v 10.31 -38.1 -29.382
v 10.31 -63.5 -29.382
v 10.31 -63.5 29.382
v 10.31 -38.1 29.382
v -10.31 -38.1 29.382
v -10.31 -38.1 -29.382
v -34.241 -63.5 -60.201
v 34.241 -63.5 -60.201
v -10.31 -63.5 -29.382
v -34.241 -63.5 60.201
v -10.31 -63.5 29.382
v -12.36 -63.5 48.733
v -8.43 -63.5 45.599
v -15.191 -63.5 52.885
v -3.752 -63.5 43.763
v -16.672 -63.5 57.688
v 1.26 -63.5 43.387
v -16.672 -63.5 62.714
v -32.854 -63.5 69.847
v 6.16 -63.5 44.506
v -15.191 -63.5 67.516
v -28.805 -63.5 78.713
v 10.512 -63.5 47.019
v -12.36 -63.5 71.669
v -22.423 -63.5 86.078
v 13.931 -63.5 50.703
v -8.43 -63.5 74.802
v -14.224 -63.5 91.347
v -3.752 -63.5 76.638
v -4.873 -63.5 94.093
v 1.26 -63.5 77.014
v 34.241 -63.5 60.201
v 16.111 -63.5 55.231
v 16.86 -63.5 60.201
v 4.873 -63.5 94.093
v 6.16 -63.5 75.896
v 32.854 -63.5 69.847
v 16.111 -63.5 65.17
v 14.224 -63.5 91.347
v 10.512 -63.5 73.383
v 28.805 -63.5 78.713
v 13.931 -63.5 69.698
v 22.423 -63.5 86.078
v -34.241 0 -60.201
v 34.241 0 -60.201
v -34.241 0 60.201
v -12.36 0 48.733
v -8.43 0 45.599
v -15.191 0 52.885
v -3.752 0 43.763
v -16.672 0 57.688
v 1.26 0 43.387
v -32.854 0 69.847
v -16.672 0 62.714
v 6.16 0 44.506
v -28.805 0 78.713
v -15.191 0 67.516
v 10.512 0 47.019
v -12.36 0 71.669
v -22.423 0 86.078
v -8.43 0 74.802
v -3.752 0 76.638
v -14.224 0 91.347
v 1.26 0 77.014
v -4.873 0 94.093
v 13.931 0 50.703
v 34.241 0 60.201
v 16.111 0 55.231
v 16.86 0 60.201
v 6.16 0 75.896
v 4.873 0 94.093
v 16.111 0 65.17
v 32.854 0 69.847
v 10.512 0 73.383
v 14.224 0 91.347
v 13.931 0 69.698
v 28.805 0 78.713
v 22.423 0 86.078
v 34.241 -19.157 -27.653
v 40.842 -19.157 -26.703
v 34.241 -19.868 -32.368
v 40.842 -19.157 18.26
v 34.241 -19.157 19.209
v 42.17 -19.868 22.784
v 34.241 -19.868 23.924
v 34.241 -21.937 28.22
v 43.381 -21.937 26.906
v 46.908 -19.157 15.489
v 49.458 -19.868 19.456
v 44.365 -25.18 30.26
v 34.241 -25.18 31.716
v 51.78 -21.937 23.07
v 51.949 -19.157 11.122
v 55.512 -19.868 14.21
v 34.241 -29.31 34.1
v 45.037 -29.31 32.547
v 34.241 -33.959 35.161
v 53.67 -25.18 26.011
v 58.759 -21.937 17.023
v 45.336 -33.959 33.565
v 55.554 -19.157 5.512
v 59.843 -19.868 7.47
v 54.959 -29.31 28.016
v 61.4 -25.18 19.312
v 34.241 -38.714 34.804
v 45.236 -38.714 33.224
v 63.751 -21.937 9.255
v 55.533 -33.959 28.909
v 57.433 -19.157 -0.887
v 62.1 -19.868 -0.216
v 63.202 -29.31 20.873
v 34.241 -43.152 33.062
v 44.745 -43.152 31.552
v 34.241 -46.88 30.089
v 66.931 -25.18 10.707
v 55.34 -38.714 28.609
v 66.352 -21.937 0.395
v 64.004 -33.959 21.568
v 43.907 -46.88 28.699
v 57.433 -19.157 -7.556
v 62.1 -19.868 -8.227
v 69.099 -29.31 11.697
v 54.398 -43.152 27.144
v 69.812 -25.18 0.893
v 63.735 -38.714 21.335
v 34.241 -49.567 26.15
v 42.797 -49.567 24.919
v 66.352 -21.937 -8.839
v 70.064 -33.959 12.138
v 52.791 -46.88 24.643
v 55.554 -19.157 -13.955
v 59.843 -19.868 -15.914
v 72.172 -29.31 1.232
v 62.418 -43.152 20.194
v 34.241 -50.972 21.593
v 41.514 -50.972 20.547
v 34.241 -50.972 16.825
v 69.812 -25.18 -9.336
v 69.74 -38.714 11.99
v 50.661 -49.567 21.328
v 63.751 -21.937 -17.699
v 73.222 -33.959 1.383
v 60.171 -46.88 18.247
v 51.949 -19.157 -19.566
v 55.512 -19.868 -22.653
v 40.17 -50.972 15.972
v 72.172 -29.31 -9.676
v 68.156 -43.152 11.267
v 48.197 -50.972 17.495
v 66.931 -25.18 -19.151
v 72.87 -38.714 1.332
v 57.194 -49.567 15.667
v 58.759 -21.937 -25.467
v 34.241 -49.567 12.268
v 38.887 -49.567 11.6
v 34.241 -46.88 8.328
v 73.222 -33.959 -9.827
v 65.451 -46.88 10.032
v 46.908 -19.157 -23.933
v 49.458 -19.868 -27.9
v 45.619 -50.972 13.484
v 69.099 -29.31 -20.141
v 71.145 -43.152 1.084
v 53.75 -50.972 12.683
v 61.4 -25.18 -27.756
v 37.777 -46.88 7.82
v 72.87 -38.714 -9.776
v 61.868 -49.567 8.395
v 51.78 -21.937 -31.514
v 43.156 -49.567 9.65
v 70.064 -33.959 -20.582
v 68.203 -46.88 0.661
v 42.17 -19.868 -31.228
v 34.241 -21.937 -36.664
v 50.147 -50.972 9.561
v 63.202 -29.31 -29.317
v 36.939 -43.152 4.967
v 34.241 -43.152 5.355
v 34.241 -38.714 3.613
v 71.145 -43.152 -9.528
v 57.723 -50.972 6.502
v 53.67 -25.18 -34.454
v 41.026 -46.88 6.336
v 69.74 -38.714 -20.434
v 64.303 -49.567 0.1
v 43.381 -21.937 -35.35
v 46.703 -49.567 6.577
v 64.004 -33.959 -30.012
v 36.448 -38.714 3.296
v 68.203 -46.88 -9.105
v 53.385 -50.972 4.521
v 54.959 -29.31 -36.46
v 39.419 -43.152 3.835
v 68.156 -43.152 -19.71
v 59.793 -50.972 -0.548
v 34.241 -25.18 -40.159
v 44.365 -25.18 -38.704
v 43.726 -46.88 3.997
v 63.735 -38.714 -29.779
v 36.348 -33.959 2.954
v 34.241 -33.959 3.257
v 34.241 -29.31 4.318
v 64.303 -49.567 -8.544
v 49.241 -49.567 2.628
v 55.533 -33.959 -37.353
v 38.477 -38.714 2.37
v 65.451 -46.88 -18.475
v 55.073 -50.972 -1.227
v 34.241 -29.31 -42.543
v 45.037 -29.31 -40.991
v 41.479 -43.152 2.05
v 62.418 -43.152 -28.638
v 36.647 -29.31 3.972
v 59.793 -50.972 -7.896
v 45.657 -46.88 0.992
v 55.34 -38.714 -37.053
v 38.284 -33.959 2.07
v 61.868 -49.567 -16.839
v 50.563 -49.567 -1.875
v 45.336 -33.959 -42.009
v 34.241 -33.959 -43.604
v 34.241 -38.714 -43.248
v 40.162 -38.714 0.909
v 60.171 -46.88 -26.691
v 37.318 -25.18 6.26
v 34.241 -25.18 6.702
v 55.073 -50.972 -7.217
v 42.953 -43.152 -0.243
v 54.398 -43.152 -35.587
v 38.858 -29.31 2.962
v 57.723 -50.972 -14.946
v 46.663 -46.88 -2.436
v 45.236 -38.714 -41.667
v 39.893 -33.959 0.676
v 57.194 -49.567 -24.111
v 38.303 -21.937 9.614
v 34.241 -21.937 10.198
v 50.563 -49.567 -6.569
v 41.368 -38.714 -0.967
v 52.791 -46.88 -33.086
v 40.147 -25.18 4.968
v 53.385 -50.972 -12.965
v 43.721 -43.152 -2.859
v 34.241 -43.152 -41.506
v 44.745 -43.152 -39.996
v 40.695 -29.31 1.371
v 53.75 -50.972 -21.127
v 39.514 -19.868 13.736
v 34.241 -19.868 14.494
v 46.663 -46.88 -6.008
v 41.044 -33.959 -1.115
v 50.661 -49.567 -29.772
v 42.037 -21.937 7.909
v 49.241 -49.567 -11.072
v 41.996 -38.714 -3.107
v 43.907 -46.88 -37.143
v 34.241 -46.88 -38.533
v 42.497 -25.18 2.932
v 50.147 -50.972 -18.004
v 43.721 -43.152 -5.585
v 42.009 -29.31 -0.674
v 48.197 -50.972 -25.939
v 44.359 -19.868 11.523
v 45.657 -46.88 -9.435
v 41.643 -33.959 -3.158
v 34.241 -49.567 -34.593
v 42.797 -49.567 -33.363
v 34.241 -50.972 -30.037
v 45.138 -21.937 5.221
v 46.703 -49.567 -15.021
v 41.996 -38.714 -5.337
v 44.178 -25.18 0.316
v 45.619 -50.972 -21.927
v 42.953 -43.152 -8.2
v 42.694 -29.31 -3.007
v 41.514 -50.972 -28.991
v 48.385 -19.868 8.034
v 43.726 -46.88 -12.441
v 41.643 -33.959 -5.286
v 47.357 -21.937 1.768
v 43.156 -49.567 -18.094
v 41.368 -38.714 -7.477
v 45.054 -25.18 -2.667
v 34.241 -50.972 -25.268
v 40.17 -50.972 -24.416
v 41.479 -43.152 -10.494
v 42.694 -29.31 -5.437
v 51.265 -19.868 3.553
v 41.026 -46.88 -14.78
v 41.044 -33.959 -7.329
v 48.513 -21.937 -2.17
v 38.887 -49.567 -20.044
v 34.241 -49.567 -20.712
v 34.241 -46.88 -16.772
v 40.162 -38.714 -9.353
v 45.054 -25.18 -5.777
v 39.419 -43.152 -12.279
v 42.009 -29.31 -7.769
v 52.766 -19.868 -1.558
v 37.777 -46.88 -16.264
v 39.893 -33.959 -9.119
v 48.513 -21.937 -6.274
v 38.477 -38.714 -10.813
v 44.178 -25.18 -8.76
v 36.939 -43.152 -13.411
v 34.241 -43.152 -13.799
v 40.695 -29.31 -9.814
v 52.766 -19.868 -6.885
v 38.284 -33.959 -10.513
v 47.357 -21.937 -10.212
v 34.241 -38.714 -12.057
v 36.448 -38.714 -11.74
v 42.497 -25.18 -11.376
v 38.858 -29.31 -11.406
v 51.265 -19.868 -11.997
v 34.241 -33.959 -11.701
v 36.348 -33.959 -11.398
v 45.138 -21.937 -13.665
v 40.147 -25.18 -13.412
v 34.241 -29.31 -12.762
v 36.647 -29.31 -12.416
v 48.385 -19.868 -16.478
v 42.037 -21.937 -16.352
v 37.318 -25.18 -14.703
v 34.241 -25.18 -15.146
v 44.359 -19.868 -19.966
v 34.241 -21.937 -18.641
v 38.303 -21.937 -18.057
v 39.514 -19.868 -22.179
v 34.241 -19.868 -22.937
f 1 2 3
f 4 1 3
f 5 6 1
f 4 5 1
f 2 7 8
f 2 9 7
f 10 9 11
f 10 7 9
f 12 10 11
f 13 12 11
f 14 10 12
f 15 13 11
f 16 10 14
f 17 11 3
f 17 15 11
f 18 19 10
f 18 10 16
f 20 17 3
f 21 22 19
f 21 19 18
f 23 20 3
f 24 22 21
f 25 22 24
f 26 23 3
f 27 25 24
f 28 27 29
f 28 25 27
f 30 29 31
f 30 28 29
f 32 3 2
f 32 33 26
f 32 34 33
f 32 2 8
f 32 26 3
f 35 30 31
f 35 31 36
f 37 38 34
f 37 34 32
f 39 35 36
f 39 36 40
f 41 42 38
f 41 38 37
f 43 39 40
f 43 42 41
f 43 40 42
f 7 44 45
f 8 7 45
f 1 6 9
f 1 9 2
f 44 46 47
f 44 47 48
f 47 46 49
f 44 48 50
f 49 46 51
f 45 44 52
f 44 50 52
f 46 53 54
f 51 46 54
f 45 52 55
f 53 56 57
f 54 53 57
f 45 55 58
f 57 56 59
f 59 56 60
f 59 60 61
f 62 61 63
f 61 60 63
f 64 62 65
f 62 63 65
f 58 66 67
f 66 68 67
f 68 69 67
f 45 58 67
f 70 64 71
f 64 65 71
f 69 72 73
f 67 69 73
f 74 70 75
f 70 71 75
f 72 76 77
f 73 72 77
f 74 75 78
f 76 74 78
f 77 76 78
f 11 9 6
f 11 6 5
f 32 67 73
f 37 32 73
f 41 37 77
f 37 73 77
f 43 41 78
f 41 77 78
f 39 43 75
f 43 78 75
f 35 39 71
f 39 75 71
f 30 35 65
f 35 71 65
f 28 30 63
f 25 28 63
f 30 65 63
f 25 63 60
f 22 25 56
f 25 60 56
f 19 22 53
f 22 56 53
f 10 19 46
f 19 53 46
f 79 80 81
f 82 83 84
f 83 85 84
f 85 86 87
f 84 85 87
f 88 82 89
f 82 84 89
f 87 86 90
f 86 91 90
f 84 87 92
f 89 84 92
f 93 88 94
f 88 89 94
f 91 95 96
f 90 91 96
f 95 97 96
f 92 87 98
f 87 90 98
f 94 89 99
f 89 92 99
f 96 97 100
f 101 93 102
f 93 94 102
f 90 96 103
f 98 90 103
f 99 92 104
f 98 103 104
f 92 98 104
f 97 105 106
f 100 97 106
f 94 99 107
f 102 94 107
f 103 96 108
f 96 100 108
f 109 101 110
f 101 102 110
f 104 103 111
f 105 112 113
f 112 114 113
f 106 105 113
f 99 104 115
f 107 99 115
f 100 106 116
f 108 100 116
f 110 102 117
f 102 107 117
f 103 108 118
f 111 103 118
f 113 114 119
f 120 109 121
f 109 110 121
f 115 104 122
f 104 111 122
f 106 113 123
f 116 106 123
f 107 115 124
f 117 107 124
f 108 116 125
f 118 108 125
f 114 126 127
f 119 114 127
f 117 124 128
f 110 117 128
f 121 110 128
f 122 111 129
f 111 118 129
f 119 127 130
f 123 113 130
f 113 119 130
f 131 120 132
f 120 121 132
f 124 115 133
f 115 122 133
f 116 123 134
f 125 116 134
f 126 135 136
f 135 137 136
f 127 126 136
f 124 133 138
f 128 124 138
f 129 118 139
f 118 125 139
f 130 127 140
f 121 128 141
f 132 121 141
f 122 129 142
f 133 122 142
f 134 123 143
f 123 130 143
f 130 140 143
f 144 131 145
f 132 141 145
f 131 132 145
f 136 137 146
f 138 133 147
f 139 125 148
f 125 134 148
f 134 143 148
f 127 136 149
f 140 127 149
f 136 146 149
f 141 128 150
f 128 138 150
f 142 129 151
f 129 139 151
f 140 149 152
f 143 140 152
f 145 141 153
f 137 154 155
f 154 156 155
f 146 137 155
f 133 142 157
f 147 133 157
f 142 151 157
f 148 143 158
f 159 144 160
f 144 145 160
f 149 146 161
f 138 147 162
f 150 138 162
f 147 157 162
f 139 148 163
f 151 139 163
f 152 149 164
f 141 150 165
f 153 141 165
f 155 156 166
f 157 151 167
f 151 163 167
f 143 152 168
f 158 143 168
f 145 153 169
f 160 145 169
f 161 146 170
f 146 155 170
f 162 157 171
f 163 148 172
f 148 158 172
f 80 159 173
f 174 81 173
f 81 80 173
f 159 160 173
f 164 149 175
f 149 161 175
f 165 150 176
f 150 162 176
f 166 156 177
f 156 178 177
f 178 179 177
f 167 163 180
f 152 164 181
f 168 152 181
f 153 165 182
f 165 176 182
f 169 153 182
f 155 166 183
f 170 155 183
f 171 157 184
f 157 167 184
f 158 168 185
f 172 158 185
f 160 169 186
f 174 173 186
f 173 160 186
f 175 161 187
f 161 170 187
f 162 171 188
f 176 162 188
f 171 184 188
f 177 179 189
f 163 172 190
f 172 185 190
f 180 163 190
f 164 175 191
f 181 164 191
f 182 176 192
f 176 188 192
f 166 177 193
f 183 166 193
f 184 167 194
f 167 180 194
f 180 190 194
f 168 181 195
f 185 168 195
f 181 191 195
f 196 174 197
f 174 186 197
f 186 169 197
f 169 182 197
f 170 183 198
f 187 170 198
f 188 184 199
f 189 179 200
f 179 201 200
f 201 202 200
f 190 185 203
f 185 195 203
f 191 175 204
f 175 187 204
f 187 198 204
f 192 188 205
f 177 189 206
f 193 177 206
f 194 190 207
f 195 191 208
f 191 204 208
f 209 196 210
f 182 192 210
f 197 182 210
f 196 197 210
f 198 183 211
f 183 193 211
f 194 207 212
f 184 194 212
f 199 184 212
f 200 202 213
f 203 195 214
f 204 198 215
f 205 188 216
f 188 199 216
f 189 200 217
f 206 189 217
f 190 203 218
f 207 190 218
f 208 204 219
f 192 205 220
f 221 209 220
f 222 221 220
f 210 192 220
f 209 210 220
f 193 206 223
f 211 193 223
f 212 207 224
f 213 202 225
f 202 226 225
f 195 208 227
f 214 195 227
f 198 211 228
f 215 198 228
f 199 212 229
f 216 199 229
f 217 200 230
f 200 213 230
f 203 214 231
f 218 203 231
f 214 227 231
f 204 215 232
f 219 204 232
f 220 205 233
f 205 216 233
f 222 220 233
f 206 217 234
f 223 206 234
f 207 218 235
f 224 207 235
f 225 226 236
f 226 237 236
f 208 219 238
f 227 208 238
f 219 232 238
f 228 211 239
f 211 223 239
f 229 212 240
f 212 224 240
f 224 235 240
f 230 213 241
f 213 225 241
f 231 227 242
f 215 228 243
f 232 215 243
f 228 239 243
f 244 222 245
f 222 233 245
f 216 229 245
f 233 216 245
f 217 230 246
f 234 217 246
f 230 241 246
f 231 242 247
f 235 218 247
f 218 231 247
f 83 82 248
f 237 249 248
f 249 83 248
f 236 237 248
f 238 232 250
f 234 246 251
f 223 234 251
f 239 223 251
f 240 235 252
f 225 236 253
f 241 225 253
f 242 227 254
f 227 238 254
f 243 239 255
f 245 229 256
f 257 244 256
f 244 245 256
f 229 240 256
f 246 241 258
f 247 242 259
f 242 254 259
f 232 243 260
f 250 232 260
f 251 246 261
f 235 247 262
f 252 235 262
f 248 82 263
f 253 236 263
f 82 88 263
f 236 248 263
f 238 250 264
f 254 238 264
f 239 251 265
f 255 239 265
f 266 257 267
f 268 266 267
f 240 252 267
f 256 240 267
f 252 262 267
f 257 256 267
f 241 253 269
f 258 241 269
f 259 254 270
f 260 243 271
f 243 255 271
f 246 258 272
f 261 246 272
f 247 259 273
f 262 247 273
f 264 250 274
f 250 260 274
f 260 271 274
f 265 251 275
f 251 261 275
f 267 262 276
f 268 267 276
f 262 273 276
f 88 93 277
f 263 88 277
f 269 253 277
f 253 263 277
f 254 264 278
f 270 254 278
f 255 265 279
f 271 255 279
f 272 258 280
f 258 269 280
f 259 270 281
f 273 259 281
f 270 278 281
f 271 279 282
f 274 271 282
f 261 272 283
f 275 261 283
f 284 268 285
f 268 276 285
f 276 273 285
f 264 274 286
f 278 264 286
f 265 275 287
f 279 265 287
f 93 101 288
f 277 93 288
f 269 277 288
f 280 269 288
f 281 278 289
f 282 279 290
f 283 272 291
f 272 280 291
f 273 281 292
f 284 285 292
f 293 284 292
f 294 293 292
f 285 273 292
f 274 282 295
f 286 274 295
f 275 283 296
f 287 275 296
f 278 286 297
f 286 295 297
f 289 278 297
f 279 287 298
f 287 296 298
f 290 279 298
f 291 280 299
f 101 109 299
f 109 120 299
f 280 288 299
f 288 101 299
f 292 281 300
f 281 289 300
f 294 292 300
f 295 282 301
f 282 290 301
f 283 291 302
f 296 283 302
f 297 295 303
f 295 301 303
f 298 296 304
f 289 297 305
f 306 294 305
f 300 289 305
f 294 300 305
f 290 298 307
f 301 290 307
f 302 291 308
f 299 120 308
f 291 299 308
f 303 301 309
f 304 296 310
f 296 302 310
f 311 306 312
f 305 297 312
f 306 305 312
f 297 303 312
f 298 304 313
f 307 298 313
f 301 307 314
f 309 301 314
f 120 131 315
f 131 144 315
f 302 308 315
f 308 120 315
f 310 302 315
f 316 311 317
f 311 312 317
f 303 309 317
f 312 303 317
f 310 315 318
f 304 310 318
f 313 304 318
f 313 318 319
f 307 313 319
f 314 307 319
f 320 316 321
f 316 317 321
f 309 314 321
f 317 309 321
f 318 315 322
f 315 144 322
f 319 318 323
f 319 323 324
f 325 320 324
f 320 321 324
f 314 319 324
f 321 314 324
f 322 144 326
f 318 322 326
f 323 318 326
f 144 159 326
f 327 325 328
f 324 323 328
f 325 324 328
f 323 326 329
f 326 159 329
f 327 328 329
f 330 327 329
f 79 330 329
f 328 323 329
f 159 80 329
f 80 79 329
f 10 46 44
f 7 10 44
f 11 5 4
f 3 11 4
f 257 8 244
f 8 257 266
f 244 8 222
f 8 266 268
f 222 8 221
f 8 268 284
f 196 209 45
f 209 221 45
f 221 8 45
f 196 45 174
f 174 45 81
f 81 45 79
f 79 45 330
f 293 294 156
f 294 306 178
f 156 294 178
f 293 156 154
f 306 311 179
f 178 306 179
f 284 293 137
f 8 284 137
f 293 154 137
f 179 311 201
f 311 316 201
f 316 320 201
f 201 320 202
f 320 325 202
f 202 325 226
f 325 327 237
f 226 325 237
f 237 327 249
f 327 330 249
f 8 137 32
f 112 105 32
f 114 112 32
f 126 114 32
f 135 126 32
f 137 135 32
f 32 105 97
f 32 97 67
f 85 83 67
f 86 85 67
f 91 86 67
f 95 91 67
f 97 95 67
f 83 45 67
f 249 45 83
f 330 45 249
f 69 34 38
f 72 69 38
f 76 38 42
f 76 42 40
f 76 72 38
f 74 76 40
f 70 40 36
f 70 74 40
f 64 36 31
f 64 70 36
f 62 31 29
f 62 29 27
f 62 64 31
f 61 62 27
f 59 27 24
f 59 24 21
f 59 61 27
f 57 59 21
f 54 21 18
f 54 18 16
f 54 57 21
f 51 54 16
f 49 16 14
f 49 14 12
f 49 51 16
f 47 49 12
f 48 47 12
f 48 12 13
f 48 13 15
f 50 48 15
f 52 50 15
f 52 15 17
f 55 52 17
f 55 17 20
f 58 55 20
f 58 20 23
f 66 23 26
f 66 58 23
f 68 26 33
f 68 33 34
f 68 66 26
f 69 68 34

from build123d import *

# Parameters (mm, degrees)
F0_R     = 16.860447
F1_DEPTH = 63.5
F2_W     = 20.619992
F2_H     = 58.763284
F3_DEPTH = 25.4
F5_R     = 15.996609
F6_ANGLE = 180


with BuildPart() as f1:
    # F0 (on Front) → F1 (new body)
    with BuildSketch(Plane.XZ):
        with BuildLine():
            Line((-34.240753, -60.200658), (34.240753, -60.200658))
            Line((34.240753, -60.200658), (34.240753, 60.200658))
            ThreePointArc((34.240753, 60.200658), (0, 94.441411), (-34.240753, 60.200658))
            Line((-34.240753, 60.200658), (-34.240753, -60.200658))
        make_face()
        with Locations((0, 60.200658)):
            Circle(F0_R, mode=Mode.SUBTRACT)
    extrude(amount=F1_DEPTH)

    # F2 (on face) → F3 (cut)
    with BuildSketch(Plane.XZ.offset(63.5)):
        Rectangle(F2_W, F2_H)
    extrude(amount=-F3_DEPTH, mode=Mode.SUBTRACT)

    # F5 (on face) → F6 (revolve)
    with BuildSketch(Plane.YZ.offset(34.240753)):
        with Locations((-35.154082, 19.208856)):
            Circle(F5_R)
    revolve(axis=Axis((34.240753, -31.75, -4.22186), (0, 1, 0)), revolution_arc=F6_ANGLE)


solid = f1.part
